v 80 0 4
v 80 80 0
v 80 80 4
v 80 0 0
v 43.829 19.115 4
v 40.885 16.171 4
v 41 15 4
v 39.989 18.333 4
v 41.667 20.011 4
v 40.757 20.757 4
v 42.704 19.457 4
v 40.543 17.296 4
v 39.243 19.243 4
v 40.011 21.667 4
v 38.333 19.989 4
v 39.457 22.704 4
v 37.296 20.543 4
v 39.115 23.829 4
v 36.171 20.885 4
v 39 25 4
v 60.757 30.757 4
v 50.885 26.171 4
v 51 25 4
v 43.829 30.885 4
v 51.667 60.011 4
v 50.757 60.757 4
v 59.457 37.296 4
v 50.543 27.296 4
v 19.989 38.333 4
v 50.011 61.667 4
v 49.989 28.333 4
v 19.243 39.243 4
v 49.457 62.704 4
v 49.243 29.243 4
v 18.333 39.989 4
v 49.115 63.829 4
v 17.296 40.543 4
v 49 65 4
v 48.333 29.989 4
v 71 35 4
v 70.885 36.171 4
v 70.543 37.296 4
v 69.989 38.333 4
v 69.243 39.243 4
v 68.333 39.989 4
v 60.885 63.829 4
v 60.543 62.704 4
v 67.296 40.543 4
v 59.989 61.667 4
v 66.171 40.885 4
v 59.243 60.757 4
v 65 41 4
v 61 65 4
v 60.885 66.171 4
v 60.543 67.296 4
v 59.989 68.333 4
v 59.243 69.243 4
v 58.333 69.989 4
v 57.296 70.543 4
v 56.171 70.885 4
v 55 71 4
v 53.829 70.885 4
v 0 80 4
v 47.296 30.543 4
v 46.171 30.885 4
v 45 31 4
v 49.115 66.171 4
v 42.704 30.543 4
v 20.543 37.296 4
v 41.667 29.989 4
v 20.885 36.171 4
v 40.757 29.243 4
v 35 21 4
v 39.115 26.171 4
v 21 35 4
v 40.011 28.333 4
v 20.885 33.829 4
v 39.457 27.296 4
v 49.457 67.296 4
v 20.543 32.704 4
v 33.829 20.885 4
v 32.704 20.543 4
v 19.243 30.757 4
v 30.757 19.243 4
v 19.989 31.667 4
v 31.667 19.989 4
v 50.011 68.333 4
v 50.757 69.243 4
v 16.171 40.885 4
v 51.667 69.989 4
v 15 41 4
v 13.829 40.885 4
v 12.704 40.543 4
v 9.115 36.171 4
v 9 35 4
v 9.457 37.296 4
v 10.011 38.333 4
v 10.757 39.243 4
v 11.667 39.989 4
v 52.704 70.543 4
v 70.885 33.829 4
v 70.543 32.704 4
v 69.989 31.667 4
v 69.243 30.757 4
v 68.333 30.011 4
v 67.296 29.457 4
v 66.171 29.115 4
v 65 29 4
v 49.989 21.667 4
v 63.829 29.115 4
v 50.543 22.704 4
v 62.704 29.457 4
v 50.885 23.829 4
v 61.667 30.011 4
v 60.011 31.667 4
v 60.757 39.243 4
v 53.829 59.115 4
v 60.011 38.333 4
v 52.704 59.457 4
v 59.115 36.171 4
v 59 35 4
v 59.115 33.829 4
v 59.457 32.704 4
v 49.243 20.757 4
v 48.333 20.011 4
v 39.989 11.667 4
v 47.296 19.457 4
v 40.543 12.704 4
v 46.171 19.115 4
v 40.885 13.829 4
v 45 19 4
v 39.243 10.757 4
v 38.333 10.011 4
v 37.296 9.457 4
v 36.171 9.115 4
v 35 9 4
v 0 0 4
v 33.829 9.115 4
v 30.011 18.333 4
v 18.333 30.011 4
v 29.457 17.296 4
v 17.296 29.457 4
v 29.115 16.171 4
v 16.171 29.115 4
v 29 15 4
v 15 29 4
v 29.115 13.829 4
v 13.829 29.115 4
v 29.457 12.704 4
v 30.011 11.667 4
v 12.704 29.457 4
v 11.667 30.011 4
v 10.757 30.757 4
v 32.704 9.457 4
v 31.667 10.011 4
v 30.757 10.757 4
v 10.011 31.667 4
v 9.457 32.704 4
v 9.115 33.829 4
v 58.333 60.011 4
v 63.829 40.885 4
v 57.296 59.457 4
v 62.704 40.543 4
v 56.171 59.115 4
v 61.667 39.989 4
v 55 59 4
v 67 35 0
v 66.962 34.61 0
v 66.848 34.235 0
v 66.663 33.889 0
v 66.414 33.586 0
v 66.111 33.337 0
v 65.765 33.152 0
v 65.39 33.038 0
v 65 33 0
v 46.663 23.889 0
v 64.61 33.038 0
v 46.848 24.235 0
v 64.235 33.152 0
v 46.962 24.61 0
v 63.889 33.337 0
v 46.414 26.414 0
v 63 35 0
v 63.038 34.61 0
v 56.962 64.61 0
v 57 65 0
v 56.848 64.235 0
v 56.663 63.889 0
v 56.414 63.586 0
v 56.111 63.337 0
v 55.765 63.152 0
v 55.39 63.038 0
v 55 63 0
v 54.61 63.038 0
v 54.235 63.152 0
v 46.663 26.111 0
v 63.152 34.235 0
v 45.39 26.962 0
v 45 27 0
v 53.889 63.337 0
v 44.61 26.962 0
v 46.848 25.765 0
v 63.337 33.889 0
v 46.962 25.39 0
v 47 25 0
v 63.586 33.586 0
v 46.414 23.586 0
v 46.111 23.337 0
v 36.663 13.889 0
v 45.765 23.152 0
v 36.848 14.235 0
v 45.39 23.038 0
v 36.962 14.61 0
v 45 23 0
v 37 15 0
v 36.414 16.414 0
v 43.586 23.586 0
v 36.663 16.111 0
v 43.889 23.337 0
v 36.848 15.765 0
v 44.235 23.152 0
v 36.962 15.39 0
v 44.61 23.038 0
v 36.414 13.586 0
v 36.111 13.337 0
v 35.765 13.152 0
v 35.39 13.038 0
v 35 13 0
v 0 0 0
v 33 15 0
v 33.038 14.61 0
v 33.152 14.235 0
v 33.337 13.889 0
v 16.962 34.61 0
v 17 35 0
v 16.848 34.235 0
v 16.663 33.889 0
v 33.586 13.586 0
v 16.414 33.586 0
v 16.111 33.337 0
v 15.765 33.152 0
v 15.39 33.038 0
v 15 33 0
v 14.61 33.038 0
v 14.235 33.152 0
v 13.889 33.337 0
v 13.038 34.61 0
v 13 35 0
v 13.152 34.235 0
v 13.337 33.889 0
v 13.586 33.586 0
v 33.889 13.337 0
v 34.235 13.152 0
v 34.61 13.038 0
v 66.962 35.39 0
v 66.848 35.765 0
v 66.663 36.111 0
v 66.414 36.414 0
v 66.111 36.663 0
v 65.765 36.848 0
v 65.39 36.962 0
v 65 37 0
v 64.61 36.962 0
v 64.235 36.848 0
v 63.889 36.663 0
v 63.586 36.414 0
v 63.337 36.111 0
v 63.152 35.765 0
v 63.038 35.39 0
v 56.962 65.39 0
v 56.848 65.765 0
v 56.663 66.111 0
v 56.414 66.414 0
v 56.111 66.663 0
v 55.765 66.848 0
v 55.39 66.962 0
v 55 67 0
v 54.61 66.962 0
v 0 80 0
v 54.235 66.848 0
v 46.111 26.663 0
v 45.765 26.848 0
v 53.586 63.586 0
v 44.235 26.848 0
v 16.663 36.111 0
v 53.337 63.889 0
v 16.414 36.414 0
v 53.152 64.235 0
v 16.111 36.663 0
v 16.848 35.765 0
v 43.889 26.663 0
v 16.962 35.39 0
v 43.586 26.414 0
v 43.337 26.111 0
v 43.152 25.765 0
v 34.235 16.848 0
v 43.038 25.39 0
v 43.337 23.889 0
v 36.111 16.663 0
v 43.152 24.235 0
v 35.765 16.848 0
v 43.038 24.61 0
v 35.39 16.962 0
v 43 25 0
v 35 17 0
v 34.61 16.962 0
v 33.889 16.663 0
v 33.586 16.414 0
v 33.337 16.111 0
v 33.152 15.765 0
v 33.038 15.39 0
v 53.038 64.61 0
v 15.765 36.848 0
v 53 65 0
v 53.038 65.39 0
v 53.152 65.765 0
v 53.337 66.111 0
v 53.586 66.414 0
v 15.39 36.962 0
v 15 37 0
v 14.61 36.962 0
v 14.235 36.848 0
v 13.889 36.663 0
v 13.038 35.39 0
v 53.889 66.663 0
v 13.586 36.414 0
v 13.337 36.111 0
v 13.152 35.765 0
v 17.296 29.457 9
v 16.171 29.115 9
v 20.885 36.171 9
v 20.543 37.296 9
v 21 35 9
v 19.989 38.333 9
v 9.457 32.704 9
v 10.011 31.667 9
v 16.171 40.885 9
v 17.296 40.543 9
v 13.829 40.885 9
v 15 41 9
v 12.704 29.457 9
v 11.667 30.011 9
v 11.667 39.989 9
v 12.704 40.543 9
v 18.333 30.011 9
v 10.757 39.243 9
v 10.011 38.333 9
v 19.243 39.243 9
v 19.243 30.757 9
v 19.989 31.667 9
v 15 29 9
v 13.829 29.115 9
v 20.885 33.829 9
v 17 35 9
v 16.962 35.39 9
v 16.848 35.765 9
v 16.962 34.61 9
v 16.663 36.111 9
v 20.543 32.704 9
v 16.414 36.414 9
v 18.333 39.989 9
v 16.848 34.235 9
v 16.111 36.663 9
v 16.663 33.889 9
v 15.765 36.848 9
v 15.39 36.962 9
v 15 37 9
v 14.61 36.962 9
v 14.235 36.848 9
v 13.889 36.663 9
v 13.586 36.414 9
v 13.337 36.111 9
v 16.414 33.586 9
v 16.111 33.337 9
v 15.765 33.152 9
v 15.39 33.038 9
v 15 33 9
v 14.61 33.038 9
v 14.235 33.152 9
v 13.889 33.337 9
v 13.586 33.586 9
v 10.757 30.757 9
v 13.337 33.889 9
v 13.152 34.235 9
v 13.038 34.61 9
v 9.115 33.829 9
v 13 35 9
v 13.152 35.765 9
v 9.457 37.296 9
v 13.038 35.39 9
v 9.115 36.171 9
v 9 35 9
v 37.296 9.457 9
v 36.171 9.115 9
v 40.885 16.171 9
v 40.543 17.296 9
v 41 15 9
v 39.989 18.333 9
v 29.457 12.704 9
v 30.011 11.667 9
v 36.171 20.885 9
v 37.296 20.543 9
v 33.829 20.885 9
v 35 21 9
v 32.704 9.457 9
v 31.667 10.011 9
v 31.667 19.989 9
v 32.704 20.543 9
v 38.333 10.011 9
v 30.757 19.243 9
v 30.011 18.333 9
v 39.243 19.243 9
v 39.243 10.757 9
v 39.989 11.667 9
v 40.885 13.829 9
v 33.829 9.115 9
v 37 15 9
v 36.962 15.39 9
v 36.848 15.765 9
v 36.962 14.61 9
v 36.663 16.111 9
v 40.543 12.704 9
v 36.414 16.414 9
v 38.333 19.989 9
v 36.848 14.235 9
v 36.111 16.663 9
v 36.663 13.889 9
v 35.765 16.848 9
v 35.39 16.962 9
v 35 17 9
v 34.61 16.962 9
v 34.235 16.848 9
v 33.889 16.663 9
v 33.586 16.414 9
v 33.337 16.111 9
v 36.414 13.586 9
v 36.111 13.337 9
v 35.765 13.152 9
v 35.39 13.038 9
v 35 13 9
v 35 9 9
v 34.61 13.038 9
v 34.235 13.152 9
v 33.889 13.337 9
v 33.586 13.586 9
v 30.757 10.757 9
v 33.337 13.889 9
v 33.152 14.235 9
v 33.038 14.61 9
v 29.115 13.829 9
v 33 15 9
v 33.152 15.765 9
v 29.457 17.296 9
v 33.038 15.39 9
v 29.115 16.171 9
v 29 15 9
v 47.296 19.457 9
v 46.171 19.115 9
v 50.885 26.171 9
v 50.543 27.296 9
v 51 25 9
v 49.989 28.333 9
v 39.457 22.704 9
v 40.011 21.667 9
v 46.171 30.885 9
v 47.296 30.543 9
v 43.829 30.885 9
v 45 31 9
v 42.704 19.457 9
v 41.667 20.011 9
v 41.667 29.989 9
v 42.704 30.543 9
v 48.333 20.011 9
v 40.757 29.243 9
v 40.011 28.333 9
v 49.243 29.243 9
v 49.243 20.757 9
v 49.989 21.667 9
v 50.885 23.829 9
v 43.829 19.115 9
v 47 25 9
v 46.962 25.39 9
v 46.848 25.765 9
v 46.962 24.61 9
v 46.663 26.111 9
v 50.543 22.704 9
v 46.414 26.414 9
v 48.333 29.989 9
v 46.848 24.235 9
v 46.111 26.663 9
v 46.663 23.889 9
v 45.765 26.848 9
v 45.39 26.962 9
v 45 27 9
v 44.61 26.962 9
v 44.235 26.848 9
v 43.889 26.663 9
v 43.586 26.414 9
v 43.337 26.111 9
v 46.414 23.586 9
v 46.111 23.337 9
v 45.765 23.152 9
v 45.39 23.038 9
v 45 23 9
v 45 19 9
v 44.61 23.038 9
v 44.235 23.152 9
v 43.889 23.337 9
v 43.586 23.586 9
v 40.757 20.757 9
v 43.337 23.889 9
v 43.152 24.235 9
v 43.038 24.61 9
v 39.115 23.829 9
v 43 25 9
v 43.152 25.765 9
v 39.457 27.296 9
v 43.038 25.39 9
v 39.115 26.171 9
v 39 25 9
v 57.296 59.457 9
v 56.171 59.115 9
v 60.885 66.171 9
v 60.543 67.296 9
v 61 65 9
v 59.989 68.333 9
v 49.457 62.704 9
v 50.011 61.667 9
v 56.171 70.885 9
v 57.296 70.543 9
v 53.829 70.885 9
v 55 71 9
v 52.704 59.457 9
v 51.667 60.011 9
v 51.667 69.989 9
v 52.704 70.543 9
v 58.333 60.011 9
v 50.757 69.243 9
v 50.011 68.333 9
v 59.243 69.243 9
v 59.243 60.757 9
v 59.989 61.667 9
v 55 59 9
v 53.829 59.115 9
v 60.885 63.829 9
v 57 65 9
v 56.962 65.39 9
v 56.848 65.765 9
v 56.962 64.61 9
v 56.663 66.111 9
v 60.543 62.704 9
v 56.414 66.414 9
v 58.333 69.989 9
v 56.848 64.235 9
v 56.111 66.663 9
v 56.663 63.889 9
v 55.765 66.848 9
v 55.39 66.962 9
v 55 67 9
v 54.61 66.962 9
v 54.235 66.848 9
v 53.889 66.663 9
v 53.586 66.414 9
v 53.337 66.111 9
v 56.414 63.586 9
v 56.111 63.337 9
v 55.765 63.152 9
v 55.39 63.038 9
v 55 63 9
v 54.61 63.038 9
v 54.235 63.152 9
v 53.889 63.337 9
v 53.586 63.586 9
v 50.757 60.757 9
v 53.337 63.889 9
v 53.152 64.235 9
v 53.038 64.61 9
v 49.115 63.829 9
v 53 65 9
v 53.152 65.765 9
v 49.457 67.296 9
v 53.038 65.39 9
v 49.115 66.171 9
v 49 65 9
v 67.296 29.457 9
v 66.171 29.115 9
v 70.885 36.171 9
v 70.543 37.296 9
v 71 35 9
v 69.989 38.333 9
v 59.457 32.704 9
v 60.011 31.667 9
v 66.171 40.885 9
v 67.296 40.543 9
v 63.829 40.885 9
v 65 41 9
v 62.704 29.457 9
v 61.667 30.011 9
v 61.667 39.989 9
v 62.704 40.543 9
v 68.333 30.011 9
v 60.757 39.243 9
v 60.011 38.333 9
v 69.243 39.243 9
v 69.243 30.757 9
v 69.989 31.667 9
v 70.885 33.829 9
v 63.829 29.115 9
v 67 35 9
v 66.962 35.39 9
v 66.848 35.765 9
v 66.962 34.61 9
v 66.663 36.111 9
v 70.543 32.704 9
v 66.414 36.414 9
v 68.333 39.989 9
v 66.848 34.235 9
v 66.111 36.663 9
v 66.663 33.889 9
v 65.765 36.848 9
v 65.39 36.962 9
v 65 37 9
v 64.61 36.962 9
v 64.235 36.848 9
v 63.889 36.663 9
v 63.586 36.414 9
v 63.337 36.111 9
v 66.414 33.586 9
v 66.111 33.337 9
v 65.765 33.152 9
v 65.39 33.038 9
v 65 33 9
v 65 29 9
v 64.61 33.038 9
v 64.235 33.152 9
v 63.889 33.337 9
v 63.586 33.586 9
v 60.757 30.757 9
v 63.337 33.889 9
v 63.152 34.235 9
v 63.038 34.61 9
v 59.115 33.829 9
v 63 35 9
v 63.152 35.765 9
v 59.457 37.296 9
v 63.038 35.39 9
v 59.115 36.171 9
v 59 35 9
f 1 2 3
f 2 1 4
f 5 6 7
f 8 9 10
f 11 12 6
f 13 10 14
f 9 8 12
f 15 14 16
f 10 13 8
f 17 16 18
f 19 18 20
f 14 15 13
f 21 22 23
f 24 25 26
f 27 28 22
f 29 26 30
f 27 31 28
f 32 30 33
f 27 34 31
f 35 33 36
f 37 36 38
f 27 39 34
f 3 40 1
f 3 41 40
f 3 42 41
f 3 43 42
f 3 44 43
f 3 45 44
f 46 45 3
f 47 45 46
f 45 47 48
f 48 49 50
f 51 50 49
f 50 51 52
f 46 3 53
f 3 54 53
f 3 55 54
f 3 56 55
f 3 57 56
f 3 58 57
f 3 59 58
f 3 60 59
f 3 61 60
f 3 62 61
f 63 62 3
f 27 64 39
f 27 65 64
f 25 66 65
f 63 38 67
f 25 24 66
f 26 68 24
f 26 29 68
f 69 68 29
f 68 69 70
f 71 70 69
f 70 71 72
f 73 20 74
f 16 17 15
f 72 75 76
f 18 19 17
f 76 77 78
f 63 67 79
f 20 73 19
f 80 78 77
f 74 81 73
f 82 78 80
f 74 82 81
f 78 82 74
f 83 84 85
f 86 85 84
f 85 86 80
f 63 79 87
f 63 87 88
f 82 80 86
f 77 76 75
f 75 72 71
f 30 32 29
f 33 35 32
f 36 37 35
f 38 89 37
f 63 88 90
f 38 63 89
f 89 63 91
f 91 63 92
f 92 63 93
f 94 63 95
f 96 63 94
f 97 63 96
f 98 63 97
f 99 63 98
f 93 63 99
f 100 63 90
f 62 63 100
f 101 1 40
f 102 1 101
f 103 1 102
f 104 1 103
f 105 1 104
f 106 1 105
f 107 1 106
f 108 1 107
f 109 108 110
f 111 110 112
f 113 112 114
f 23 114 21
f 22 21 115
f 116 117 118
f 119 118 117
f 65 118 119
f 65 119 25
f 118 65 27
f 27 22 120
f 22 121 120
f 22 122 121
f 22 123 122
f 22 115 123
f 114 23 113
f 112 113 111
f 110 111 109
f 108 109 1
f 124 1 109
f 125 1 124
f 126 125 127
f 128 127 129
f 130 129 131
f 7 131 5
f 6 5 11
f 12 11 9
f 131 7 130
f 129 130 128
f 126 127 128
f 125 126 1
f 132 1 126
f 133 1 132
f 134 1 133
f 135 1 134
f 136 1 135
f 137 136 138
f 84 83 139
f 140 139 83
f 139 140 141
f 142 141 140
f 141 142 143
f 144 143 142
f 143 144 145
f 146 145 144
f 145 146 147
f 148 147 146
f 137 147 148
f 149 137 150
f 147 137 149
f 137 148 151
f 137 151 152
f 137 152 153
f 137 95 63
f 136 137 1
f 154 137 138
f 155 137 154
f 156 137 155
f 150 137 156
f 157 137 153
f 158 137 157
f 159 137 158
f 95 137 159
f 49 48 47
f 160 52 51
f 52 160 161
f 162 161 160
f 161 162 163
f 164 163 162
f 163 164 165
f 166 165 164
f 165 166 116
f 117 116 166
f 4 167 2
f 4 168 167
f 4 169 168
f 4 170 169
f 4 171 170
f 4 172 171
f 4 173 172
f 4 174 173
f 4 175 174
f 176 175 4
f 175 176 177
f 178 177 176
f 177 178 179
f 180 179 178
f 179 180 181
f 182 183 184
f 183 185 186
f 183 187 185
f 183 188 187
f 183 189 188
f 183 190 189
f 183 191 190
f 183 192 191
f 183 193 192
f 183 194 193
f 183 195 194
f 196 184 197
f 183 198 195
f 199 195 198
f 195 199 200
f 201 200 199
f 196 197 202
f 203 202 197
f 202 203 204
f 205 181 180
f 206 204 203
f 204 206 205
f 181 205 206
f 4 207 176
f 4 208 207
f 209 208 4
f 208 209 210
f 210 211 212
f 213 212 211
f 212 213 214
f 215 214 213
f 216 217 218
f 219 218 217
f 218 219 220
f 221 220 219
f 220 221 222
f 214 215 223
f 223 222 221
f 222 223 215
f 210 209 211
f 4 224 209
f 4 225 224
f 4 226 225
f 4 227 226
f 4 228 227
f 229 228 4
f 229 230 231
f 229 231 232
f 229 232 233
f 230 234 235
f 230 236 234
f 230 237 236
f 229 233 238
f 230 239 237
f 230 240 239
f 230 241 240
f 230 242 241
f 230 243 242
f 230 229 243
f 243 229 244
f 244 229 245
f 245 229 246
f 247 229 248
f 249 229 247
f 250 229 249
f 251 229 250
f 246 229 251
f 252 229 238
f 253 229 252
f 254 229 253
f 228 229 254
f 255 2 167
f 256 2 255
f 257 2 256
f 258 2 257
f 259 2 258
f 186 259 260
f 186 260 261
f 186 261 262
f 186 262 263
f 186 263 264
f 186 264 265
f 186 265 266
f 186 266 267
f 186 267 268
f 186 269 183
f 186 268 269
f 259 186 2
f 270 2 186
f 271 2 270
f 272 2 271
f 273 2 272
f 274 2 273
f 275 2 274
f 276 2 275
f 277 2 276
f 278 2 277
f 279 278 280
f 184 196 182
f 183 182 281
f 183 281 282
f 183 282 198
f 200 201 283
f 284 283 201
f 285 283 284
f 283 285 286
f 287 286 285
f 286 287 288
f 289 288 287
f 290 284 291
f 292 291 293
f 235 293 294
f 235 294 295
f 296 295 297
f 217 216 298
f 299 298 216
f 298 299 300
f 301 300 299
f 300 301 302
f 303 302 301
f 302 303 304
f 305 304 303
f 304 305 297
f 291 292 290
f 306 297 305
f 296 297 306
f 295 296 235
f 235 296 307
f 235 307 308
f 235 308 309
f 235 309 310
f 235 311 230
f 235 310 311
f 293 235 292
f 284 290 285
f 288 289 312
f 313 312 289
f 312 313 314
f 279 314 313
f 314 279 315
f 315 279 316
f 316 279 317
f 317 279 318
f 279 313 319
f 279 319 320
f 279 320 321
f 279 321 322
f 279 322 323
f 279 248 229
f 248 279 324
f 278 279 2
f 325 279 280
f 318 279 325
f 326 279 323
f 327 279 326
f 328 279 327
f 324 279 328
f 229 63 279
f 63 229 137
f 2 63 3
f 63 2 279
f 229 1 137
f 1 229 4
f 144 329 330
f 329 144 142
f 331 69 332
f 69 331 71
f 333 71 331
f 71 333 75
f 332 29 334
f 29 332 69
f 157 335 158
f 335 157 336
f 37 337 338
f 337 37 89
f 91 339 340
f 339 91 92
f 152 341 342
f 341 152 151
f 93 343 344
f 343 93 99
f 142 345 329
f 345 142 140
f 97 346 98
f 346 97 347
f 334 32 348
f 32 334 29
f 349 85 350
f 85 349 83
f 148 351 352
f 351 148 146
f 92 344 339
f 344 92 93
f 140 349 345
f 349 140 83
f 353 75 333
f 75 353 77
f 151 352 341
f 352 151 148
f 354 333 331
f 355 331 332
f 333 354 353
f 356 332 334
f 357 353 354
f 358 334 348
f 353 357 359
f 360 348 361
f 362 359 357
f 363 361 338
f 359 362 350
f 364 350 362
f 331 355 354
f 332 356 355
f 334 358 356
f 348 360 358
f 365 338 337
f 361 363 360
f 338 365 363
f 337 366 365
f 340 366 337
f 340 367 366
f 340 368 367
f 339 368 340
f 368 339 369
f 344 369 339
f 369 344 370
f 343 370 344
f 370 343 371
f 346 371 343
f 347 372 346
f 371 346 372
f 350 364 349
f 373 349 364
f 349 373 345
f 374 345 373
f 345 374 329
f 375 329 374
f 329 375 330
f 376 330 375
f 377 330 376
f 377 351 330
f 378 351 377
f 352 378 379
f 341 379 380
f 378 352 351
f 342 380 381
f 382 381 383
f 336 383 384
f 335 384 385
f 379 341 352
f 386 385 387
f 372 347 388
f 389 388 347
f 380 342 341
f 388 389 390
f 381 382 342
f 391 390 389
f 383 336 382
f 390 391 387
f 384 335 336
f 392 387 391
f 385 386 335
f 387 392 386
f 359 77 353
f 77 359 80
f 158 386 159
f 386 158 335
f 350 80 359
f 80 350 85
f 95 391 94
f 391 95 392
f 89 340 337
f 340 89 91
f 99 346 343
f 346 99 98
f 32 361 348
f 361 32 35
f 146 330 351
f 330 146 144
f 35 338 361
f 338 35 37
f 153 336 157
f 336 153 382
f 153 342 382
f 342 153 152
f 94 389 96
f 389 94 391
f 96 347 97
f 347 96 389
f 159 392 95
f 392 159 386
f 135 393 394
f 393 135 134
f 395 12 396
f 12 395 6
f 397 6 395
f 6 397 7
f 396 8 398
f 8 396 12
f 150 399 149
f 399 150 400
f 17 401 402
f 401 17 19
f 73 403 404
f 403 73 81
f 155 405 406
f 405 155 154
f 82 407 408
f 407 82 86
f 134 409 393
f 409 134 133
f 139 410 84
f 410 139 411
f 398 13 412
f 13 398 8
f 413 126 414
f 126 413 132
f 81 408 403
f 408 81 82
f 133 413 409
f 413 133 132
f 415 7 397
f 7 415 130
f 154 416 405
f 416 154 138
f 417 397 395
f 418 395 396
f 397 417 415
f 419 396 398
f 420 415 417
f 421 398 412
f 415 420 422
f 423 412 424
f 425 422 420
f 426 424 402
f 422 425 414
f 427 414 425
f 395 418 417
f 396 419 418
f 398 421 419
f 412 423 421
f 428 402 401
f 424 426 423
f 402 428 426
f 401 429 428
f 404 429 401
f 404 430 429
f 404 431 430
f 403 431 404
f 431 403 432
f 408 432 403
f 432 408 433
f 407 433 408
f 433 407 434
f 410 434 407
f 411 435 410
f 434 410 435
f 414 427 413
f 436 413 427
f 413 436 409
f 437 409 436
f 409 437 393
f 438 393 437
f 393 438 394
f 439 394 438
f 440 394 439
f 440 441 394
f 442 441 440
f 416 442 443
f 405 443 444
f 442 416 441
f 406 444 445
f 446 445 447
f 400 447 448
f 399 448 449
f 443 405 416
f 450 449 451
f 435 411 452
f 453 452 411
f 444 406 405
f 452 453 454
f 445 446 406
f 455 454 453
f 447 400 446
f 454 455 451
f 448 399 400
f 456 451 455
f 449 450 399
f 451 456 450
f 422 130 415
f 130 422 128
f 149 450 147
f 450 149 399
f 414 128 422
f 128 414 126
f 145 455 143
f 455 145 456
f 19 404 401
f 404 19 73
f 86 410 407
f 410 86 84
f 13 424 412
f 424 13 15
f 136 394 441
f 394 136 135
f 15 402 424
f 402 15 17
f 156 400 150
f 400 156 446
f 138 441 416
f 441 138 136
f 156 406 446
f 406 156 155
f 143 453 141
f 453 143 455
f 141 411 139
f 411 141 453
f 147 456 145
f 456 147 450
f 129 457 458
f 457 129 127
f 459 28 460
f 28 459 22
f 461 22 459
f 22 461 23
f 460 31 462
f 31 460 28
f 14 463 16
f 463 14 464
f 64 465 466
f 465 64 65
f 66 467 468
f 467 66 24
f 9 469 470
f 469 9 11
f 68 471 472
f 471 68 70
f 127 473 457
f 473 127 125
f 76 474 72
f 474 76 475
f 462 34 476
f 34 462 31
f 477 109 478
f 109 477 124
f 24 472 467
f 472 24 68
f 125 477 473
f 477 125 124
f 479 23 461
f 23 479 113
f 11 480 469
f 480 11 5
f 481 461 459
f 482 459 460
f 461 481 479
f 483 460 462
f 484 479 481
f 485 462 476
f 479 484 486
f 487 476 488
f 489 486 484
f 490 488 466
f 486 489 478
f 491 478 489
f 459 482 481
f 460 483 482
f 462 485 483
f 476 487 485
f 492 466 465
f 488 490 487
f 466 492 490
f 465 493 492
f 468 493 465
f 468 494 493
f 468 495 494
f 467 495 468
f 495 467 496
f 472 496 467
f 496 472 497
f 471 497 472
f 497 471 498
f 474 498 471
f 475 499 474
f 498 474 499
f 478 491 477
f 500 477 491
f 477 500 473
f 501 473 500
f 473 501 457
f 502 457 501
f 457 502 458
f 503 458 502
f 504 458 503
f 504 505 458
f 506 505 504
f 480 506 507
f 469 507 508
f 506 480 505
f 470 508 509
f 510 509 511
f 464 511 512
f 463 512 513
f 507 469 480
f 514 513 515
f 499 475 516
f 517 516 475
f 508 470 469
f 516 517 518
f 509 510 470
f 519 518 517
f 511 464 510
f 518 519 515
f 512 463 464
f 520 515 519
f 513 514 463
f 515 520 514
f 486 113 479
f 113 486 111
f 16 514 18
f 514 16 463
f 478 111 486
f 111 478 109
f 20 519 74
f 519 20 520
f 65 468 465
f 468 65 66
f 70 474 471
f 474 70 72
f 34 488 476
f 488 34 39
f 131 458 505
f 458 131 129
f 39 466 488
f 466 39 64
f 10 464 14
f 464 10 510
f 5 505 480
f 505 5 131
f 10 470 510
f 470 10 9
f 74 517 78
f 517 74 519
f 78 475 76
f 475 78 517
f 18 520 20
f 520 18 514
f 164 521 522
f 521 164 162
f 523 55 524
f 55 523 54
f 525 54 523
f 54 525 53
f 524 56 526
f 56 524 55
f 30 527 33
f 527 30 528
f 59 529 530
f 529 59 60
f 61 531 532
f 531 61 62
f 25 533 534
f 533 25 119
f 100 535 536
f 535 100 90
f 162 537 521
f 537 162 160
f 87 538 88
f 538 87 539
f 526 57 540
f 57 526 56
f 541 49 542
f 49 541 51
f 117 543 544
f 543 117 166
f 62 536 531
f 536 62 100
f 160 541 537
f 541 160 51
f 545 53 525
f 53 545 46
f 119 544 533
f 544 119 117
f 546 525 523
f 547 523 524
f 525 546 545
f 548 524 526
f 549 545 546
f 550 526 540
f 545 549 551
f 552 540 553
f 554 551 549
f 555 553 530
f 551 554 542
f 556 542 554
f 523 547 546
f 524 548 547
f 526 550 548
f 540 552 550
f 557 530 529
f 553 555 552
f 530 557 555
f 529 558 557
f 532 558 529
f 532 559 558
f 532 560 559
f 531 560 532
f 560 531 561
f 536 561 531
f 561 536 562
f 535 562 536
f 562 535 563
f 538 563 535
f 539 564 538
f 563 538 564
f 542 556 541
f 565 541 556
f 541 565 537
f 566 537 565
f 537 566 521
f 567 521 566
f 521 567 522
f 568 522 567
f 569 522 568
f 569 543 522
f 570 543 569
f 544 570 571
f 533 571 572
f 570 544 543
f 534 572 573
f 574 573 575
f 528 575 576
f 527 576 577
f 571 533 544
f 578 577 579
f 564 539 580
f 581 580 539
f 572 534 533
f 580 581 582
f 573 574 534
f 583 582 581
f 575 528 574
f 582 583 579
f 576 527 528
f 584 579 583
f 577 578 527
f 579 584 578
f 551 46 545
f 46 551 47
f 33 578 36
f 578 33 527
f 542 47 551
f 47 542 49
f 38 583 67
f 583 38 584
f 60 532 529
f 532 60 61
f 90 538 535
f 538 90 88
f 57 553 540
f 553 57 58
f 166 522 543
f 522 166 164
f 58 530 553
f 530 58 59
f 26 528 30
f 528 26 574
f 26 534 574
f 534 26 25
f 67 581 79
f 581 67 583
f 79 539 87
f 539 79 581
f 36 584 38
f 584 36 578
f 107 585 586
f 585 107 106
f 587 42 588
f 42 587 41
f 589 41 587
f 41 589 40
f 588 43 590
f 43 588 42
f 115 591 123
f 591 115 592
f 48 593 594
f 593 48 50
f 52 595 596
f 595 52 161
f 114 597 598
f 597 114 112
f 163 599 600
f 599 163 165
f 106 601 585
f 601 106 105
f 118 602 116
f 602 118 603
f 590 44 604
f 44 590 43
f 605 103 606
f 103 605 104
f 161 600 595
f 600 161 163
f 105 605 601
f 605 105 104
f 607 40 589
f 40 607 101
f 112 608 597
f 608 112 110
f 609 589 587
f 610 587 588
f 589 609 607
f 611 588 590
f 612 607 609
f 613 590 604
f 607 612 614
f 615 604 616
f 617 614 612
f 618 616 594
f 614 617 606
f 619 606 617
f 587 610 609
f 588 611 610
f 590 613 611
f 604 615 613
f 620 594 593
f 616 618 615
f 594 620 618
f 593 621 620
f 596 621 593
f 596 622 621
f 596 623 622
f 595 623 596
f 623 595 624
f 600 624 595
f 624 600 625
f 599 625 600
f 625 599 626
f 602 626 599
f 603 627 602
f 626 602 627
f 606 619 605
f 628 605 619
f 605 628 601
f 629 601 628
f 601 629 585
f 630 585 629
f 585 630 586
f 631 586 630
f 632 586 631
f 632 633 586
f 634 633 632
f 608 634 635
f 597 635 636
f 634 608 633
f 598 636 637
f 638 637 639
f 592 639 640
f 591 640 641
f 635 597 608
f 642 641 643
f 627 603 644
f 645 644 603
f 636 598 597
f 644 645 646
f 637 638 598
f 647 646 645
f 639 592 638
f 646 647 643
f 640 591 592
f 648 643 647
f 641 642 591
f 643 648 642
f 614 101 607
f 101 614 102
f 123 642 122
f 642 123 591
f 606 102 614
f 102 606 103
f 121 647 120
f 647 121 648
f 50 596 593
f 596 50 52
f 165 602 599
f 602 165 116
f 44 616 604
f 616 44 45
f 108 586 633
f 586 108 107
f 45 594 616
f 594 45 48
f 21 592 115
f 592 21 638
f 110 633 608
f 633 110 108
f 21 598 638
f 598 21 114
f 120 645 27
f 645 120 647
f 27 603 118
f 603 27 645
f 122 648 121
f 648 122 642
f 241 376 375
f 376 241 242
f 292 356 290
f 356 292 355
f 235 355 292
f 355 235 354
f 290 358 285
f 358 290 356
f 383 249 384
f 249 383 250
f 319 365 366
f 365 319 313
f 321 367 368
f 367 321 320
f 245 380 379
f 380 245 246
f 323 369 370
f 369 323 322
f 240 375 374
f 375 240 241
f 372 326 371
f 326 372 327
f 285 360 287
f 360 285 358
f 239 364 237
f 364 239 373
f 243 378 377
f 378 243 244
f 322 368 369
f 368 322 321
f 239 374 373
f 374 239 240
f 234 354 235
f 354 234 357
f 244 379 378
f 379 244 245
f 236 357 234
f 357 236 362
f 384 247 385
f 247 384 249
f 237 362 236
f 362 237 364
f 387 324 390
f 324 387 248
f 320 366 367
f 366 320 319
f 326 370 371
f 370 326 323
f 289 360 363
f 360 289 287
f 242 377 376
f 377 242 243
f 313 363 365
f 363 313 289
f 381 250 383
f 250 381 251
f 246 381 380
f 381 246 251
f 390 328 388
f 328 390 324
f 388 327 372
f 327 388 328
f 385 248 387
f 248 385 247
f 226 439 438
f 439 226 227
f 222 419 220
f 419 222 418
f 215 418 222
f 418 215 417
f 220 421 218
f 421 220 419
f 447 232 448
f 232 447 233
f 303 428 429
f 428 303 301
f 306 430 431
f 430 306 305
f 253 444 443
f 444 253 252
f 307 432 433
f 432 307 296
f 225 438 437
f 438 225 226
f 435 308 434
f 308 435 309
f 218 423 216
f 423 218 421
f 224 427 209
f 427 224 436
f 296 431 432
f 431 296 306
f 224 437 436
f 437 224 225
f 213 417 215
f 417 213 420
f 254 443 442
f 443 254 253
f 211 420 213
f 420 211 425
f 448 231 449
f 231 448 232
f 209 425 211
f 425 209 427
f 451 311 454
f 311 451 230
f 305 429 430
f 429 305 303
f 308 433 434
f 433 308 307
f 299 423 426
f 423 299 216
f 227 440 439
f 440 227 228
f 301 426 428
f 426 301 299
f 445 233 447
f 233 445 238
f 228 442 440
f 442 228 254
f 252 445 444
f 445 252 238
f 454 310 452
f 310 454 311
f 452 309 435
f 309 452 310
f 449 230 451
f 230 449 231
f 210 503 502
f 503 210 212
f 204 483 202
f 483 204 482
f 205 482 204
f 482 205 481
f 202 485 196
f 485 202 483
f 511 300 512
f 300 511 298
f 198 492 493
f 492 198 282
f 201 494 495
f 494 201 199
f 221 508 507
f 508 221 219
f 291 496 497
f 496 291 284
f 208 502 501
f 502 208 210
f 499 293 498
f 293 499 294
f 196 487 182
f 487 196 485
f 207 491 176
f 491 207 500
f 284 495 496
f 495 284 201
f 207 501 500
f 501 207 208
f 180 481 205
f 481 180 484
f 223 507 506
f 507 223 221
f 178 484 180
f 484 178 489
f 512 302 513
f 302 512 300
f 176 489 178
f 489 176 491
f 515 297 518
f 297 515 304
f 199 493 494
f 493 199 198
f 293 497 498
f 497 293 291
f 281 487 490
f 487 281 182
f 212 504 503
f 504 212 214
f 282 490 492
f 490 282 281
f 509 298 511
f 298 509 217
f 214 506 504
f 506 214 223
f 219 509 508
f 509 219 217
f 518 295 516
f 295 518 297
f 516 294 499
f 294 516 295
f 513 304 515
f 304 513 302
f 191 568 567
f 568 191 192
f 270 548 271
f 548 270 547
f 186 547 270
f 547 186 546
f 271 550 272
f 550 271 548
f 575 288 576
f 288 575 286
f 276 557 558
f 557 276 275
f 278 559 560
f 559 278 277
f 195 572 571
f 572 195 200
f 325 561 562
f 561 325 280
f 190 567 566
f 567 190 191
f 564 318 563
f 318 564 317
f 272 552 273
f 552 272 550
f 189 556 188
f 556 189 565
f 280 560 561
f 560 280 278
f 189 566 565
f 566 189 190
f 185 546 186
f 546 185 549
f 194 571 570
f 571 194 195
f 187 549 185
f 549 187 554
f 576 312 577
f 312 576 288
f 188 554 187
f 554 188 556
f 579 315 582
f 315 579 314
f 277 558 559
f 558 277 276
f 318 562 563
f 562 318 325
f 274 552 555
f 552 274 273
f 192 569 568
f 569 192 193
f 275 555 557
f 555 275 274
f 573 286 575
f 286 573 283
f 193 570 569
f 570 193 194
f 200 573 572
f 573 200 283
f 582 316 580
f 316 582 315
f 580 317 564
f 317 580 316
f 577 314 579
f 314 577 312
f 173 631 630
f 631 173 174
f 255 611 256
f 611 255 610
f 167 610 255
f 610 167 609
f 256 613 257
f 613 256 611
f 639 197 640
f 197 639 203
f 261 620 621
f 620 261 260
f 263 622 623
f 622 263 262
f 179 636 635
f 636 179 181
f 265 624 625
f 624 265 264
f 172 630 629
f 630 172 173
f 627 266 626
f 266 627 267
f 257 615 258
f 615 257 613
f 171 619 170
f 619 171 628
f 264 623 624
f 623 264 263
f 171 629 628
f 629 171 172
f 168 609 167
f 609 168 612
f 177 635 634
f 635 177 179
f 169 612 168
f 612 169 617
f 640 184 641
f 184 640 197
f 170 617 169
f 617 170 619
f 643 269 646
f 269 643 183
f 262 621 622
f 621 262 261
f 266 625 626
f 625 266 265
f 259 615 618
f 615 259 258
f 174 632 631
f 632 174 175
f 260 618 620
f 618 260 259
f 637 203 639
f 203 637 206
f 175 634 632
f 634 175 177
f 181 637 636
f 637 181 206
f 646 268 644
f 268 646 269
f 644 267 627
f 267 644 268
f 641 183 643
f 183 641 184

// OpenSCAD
$fn = 32;

// ----------------------------------------------------------------------
// Boss field: plate with bosses at given coordinates
// ----------------------------------------------------------------------

// --- parameters (mm) ---
plate_l = 80;             // plate length, X
plate_w = 80;             // plate width, Y
plate_t = 4;              // plate thickness, Z
boss_d = 12;              // boss diameter
boss_h = 5;               // boss height above the plate
bore_d = 4;               // boss bore

total_h = plate_t + boss_h;  // overall height

difference() {
  union() {
    cube([plate_l, plate_w, plate_t]);
    translate([15, 35, plate_t]) cylinder(h = boss_h, d = boss_d);
    translate([35, 15, plate_t]) cylinder(h = boss_h, d = boss_d);
    translate([45, 25, plate_t]) cylinder(h = boss_h, d = boss_d);
    translate([55, 65, plate_t]) cylinder(h = boss_h, d = boss_d);
    translate([65, 35, plate_t]) cylinder(h = boss_h, d = boss_d);
  }
  translate([15, 35, -1]) cylinder(h = total_h + 2, d = bore_d);
  translate([35, 15, -1]) cylinder(h = total_h + 2, d = bore_d);
  translate([45, 25, -1]) cylinder(h = total_h + 2, d = bore_d);
  translate([55, 65, -1]) cylinder(h = total_h + 2, d = bore_d);
  translate([65, 35, -1]) cylinder(h = total_h + 2, d = bore_d);
}
